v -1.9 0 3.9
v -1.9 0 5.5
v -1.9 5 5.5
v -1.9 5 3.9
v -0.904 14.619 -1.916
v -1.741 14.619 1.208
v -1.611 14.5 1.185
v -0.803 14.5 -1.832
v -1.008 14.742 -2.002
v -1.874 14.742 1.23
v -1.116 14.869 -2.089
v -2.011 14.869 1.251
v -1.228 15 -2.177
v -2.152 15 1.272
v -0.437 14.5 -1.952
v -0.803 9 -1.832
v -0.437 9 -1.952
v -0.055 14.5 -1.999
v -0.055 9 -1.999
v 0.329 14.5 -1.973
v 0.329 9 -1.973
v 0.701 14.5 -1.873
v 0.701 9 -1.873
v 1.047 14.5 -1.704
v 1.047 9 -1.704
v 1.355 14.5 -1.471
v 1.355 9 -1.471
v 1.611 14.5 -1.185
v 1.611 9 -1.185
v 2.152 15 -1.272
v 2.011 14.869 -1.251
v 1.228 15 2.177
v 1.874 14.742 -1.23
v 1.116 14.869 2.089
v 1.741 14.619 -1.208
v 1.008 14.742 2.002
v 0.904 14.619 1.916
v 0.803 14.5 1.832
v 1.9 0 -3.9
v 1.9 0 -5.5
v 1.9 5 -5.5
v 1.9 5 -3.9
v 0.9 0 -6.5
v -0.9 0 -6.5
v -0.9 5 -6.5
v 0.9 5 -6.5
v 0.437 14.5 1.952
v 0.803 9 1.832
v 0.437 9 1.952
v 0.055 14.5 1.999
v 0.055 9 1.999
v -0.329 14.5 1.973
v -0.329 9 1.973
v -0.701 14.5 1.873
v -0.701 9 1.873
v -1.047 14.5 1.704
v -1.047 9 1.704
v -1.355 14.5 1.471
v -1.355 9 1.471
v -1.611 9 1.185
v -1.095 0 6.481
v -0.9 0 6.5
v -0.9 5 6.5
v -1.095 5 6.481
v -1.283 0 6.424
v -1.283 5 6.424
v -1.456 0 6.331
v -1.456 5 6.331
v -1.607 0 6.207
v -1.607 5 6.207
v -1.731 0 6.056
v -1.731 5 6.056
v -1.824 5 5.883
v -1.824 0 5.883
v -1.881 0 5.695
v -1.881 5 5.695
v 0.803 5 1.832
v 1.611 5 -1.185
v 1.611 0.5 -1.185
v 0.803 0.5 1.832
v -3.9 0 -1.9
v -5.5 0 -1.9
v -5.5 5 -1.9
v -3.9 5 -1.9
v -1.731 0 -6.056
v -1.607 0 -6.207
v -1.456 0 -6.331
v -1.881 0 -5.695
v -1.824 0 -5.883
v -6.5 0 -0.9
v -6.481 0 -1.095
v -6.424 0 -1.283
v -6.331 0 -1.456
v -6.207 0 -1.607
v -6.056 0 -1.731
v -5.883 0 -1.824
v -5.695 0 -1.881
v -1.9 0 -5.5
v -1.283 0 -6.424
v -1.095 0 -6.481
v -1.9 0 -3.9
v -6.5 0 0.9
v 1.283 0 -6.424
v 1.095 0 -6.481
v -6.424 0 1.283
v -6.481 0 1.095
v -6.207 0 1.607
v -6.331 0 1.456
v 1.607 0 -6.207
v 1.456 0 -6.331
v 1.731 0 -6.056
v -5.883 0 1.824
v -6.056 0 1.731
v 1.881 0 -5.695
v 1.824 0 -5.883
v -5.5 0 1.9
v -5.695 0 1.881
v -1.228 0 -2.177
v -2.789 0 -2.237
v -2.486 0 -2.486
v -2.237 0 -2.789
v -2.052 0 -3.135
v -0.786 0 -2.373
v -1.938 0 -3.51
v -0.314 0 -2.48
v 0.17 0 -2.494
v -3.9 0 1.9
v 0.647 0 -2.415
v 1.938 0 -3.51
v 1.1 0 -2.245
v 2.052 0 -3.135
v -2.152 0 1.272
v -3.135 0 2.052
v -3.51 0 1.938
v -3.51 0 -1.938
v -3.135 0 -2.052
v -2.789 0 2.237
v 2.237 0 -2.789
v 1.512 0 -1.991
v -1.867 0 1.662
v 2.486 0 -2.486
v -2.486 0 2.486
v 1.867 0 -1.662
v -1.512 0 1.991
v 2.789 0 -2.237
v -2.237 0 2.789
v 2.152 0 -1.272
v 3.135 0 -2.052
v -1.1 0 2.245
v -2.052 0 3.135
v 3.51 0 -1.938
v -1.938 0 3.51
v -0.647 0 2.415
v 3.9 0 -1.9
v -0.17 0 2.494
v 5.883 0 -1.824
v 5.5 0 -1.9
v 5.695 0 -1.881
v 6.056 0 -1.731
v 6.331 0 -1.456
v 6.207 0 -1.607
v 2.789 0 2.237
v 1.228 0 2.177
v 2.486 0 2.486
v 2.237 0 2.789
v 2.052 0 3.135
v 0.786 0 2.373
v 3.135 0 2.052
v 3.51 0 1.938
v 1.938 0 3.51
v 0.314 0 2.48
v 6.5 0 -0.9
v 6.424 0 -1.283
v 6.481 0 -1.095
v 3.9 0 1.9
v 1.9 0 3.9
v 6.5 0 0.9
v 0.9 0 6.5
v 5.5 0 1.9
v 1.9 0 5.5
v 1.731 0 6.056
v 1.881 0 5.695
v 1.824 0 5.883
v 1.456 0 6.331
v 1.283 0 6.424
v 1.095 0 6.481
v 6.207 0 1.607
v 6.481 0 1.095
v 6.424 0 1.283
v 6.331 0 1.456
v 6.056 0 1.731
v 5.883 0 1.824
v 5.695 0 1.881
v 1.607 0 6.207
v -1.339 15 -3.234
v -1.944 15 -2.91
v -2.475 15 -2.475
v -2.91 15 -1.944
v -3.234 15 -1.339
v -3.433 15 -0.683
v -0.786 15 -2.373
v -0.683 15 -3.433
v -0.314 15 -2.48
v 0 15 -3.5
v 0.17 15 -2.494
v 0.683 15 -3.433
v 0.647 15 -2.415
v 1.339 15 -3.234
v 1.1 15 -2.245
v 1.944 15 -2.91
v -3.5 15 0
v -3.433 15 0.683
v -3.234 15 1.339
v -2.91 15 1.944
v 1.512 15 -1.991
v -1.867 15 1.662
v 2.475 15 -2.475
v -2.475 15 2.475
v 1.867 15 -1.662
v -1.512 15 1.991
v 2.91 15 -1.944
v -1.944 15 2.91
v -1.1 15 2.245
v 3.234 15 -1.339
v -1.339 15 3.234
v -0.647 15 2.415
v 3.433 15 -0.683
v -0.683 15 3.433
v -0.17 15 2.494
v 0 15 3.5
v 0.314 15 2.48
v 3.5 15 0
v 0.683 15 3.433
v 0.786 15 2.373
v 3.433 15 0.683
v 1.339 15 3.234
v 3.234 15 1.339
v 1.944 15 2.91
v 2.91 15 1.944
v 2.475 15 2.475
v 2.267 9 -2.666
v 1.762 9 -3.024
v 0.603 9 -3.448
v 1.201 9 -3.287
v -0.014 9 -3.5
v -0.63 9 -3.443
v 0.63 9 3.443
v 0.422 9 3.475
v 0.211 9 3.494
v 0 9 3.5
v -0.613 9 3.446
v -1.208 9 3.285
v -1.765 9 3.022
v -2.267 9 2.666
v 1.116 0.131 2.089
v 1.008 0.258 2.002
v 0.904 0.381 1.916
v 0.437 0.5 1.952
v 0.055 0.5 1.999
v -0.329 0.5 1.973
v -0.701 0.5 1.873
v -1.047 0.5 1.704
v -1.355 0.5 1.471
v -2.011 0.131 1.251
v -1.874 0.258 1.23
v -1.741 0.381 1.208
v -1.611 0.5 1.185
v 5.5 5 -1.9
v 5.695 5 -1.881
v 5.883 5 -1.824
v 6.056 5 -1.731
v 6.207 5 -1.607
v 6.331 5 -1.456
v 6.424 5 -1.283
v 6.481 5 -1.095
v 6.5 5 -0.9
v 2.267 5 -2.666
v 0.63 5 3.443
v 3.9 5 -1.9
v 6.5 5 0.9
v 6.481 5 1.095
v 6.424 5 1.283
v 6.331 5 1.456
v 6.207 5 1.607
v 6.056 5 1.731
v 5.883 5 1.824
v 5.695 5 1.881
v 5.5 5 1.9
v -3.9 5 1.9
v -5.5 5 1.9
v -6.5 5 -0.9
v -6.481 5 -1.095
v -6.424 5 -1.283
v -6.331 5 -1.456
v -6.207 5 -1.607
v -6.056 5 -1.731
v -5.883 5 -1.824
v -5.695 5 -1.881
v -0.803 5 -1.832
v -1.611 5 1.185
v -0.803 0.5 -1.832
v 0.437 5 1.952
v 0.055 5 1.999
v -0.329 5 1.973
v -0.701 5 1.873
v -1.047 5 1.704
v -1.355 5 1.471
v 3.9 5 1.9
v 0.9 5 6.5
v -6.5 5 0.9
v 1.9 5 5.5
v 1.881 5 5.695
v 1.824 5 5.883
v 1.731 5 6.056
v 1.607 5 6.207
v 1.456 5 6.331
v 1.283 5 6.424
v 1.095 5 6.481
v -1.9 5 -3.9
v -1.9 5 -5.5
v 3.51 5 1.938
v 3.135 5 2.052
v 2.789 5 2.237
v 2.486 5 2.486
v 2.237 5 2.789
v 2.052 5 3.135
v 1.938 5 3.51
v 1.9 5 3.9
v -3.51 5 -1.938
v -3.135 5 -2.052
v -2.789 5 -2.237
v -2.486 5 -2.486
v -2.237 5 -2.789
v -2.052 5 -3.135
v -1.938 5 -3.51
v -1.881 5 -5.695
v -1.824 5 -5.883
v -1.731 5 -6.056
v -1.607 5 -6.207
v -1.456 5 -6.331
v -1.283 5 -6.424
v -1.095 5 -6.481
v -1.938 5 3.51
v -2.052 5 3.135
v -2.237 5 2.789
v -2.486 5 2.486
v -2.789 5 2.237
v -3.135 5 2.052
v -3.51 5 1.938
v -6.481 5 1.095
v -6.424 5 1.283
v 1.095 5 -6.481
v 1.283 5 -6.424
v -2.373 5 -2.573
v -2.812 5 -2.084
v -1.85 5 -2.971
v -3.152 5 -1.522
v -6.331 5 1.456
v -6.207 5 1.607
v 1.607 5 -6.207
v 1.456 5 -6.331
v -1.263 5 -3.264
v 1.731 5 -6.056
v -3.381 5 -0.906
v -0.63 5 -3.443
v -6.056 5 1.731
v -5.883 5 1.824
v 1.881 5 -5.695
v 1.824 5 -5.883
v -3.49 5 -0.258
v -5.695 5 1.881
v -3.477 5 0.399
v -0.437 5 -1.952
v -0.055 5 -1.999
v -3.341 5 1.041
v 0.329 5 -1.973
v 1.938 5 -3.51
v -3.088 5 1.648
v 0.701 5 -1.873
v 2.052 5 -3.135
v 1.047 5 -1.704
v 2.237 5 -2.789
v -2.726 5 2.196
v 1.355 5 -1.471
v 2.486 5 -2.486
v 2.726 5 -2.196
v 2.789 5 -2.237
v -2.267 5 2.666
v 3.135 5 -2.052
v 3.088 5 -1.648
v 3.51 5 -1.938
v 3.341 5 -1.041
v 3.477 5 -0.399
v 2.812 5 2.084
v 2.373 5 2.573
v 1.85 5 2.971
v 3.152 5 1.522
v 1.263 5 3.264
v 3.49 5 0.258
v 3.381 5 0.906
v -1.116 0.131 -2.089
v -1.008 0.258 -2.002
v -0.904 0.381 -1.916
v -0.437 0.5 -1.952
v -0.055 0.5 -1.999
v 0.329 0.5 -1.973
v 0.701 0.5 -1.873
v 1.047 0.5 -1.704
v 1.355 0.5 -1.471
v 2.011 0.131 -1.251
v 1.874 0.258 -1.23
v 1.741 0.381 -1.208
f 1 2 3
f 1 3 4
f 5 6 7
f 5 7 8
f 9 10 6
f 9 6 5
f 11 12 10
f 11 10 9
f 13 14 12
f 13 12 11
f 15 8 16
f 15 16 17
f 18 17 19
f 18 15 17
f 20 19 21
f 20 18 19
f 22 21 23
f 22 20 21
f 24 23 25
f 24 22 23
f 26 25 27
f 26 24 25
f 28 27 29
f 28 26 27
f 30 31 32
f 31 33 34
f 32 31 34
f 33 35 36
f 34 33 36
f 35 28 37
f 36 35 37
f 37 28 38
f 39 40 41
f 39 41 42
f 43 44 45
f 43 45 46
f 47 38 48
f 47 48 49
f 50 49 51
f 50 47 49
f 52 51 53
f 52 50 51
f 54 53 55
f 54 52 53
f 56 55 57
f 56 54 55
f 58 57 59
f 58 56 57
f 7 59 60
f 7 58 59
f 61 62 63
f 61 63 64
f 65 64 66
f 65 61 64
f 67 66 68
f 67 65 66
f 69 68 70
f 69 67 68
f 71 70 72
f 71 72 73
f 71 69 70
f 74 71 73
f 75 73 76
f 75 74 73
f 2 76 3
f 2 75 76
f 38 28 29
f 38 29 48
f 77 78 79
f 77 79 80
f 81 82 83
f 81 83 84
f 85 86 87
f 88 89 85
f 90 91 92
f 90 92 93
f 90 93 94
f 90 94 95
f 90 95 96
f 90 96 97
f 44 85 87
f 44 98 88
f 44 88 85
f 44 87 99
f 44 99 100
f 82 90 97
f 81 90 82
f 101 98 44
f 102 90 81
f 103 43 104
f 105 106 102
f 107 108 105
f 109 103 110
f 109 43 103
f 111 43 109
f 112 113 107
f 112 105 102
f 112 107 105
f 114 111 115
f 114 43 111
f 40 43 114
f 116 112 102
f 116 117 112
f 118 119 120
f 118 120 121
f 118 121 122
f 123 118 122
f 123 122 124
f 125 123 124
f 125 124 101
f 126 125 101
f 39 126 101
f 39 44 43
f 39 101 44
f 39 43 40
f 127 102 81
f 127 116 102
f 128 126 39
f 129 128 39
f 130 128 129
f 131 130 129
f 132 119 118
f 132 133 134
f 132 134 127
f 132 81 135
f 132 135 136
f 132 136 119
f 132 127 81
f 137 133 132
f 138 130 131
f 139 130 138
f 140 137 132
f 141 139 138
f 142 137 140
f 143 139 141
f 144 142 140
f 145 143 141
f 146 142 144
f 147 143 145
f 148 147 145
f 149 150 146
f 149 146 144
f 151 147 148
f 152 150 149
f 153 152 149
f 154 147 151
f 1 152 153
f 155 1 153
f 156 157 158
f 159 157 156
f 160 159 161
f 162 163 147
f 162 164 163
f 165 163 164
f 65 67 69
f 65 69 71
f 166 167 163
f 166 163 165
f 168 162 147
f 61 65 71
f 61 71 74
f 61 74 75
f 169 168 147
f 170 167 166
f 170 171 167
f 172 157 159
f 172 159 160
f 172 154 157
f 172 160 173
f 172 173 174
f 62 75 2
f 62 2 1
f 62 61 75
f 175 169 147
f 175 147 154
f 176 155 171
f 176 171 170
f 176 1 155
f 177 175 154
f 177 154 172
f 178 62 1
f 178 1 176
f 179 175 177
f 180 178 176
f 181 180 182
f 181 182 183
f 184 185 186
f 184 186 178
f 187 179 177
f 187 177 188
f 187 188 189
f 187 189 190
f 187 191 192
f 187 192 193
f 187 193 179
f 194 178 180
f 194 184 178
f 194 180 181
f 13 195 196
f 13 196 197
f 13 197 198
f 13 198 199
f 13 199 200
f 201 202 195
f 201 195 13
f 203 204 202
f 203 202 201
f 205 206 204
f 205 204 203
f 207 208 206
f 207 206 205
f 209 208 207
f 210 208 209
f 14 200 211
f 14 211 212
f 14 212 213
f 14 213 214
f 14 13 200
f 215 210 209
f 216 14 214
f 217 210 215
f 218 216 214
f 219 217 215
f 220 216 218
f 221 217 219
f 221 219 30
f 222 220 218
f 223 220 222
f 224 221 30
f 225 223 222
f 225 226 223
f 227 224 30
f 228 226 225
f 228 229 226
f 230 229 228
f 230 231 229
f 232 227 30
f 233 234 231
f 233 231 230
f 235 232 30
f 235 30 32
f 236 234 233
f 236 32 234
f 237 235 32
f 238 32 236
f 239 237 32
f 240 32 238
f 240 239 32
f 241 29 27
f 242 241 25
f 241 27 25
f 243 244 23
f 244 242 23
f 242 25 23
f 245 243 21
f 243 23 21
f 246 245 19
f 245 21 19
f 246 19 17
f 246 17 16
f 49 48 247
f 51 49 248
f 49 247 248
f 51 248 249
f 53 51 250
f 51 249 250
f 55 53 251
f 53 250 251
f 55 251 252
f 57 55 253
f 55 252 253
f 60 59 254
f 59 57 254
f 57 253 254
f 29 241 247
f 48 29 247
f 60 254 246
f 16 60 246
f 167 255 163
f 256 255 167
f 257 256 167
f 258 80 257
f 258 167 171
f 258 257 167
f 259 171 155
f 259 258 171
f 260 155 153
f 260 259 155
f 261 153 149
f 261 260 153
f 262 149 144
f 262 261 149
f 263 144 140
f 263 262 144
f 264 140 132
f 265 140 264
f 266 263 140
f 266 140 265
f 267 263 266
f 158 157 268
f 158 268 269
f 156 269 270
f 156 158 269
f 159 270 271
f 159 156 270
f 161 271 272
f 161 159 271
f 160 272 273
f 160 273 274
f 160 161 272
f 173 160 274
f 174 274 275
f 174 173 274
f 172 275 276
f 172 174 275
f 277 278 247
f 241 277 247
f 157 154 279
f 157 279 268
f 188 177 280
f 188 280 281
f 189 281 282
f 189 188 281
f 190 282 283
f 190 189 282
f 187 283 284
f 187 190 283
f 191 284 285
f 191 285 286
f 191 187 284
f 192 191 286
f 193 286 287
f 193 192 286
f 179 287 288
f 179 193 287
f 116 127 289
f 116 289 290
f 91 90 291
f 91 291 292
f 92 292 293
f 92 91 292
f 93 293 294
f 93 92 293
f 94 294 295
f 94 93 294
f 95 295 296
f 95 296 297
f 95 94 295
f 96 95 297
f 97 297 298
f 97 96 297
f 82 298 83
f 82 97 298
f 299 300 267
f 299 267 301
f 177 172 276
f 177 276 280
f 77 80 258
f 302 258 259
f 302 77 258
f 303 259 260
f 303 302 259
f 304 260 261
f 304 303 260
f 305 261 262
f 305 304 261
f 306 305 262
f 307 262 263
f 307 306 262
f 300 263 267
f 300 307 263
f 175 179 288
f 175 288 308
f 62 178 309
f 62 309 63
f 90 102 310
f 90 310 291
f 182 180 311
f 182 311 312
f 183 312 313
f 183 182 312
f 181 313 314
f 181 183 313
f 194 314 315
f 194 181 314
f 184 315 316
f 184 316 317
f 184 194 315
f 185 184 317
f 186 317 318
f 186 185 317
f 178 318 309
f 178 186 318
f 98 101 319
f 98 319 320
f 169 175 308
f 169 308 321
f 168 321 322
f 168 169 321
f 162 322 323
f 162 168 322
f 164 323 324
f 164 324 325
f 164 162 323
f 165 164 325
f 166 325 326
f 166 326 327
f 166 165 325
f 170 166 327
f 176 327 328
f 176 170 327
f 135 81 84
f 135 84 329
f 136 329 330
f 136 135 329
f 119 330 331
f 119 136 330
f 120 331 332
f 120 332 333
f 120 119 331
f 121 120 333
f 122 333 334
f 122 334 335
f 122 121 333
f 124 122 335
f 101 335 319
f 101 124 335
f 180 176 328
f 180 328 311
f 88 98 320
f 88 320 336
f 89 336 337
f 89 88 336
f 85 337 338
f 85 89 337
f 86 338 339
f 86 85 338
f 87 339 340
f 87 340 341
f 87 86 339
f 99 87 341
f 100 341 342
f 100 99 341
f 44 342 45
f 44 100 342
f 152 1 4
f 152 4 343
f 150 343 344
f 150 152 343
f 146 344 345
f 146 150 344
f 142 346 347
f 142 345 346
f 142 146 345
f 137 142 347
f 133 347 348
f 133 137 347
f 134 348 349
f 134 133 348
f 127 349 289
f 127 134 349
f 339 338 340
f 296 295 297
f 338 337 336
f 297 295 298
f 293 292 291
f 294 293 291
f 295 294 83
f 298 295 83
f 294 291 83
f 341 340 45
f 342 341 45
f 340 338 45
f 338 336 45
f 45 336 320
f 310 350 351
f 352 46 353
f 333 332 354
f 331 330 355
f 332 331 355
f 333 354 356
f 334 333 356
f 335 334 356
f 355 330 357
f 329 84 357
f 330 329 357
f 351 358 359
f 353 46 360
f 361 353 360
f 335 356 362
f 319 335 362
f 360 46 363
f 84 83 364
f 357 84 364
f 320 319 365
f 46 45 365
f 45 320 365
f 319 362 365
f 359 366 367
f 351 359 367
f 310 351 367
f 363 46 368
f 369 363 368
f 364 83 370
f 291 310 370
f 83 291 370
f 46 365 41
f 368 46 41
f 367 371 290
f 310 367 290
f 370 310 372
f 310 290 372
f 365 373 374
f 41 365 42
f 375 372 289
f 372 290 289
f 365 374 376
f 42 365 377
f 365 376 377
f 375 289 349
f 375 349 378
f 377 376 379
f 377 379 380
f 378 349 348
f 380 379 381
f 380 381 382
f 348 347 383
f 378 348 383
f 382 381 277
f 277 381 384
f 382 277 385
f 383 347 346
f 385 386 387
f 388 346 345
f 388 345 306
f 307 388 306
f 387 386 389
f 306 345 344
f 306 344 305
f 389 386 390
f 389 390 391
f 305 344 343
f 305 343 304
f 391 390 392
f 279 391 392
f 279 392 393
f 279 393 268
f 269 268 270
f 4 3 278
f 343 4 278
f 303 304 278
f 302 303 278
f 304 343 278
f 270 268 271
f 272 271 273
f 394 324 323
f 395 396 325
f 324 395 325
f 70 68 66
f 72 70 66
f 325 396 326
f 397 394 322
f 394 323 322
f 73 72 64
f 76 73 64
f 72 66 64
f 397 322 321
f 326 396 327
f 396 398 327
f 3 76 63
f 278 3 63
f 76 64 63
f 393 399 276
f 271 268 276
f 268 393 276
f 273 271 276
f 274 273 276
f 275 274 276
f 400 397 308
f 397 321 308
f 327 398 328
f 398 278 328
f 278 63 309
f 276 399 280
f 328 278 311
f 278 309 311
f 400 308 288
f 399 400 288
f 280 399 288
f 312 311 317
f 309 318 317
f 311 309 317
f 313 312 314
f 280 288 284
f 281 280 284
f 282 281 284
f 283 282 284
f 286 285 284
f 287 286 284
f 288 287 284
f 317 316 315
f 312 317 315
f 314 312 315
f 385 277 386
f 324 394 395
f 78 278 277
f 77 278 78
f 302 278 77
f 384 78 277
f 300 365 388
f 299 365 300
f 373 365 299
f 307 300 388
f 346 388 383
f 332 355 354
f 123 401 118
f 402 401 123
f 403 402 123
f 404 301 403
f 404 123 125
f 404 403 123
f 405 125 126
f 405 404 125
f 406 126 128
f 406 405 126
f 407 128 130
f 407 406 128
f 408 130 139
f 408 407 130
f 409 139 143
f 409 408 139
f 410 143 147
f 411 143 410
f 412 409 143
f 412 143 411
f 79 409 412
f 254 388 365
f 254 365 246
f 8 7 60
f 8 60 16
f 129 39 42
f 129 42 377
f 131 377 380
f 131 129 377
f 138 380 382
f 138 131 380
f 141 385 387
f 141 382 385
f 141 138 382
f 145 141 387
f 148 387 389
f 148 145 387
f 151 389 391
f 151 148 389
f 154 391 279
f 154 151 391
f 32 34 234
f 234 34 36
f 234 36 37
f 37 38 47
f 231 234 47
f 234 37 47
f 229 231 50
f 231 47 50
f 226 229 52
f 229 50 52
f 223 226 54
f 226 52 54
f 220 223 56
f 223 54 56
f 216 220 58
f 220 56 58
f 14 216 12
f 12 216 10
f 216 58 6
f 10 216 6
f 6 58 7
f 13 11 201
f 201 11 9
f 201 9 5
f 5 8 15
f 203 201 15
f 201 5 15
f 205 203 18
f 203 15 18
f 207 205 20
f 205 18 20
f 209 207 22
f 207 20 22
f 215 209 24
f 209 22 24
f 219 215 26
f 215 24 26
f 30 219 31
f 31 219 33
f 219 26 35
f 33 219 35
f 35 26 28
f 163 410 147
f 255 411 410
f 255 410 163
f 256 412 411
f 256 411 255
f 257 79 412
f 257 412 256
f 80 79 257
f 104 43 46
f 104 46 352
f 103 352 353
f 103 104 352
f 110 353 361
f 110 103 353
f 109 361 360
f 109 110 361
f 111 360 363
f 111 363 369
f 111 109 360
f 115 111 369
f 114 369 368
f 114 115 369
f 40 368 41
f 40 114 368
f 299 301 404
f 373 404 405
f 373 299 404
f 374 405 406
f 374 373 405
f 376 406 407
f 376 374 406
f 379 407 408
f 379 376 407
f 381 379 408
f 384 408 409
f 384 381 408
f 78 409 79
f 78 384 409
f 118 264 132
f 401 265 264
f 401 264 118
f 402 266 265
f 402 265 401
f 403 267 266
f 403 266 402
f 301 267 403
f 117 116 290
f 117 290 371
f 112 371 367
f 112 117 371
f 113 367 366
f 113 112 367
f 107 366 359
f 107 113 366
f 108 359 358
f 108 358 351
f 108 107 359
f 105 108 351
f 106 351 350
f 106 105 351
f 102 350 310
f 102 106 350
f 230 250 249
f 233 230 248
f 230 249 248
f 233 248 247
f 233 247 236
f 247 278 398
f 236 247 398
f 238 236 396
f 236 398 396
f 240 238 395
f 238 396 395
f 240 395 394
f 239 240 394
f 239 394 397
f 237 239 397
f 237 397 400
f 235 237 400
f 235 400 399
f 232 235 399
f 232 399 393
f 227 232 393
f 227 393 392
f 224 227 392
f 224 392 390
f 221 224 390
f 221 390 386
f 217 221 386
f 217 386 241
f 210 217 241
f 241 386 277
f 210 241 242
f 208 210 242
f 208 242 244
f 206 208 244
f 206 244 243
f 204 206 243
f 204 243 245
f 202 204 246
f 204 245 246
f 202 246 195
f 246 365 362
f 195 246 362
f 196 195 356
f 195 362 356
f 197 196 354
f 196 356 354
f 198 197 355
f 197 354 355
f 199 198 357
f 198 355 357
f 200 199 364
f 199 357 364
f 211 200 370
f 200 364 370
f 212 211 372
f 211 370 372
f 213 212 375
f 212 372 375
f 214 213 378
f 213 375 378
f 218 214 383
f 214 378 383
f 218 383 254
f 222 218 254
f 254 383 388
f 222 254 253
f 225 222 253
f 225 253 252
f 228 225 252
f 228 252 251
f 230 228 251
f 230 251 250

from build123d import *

# Parameters (mm, degrees)
SKETCH_1_R               = 3.5
EXTRUDE_1_DEPTH          = 15
EXTRUDE_2_DEPTH          = 5
CUT_EXTRUDE_1_DEPTH      = 15
CUT_EXTRUDE_2_DEPTH      = 15
CUT_EXTRUDE_2_DEPTH_BACK = 15
SKETCH_5_W               = 3
SKETCH_5_H               = 4
CHAMFER_1_SIZE           = 0.5


with BuildPart() as part:
    # 草图1 → 凸台-拉伸1 (new body)
    with BuildSketch(Plane(origin=(0, 0, 0), x_dir=(1, 0, 0), z_dir=(0, 1, 0))):
        Circle(SKETCH_1_R)
    extrude(amount=EXTRUDE_1_DEPTH)

    # 草图2 → 凸台-拉伸2 (add)
    with BuildSketch(Plane.XZ):
        with BuildLine():
            Line((0.9, 6.5), (-0.9, 6.5))
            ThreePointArc((-0.9, 6.5), (-1.607106781, 6.207106781), (-1.9, 5.5))
            Line((-1.9, 5.5), (-1.9, 3.9))
            ThreePointArc((-1.9, 3.9), (-2.485786438, 2.485786438), (-3.9, 1.9))
            Line((-3.9, 1.9), (-5.5, 1.9))
            ThreePointArc((-5.5, 1.9), (-6.207106781, 1.607106781), (-6.5, 0.9))
            Line((-6.5, 0.9), (-6.5, -0.9))
            ThreePointArc((-6.5, -0.9), (-6.207106781, -1.607106781), (-5.5, -1.9))
            Line((-5.5, -1.9), (-3.9, -1.9))
            ThreePointArc((-3.9, -1.9), (-2.485786438, -2.485786438), (-1.9, -3.9))
            Line((-1.9, -3.9), (-1.9, -5.5))
            ThreePointArc((-1.9, -5.5), (-1.607106781, -6.207106781), (-0.9, -6.5))
            Line((-0.9, -6.5), (0.9, -6.5))
            ThreePointArc((0.9, -6.5), (1.607106781, -6.207106781), (1.9, -5.5))
            Line((1.9, -5.5), (1.9, -3.9))
            ThreePointArc((1.9, -3.9), (2.485786438, -2.485786438), (3.9, -1.9))
            Line((3.9, -1.9), (5.5, -1.9))
            ThreePointArc((5.5, -1.9), (6.207106781, -1.607106781), (6.5, -0.9))
            Line((6.5, -0.9), (6.5, 0.9))
            ThreePointArc((6.5, 0.9), (6.207106781, 1.607106781), (5.5, 1.9))
            Line((5.5, 1.9), (3.9, 1.9))
            ThreePointArc((3.9, 1.9), (2.485786438, 2.485786438), (1.9, 3.9))
            Line((1.9, 3.9), (1.9, 5.5))
            ThreePointArc((1.9, 5.5), (1.607106781, 6.207106781), (0.9, 6.5))
        make_face()
    extrude(amount=-EXTRUDE_2_DEPTH)

    # 草图3 → 切除-拉伸1 (cut)
    with BuildSketch(Plane(origin=(0, 15, 0), x_dir=(1, 0, 0), z_dir=(0, 1, 0))):
        with BuildLine():
            Line((1.207407283, -0.323523806), (0.803326178, -1.831575019))
            ThreePointArc((0.803326178, -1.831575019), (-0.51763809, -1.931851653), (-1.611488388, -1.184527407))
            Line((-1.611488388, -1.184527407), (-1.207407283, 0.323523806))
            Line((-1.207407283, 0.323523806), (-0.803326178, 1.831575019))
            ThreePointArc((-0.803326178, 1.831575019), (0.51763809, 1.931851653), (1.611488388, 1.184527407))
            Line((1.611488388, 1.184527407), (1.207407283, -0.323523806))
        make_face()
    extrude(amount=-CUT_EXTRUDE_1_DEPTH, mode=Mode.SUBTRACT)

    # 草图5 → 切除-拉伸2 (cut, two sides: drawn at the far end of the back side and taken through both)
    with BuildSketch(Plane(origin=(0, 0, 0), x_dir=(-0.96592582628907, 0, -0.2588190451025146), z_dir=(0.2588190451025146, 0, -0.96592582628907)).offset(-CUT_EXTRUDE_2_DEPTH_BACK)):
        with Locations((0, 7)):
            Rectangle(SKETCH_5_W, SKETCH_5_H)
    extrude(amount=CUT_EXTRUDE_2_DEPTH + CUT_EXTRUDE_2_DEPTH_BACK, mode=Mode.SUBTRACT)

    # 倒角1
    chamfer_1_edges = [part.edges().sort_by_distance(p)[0] for p in [
        (1.207407283, 0, 0.323523806),
        (0.51763809, 0, -1.931851653),
        (-1.207407283, 0, -0.323523806),
        (-0.51763809, 0, 1.931851653),
        (-0.51763809, 15, 1.931851653),
        (-1.207407283, 15, -0.323523806),
        (0.51763809, 15, -1.931851653),
        (1.207407283, 15, 0.323523806),
    ]]
    chamfer(chamfer_1_edges, length=CHAMFER_1_SIZE)


solid = part.part
